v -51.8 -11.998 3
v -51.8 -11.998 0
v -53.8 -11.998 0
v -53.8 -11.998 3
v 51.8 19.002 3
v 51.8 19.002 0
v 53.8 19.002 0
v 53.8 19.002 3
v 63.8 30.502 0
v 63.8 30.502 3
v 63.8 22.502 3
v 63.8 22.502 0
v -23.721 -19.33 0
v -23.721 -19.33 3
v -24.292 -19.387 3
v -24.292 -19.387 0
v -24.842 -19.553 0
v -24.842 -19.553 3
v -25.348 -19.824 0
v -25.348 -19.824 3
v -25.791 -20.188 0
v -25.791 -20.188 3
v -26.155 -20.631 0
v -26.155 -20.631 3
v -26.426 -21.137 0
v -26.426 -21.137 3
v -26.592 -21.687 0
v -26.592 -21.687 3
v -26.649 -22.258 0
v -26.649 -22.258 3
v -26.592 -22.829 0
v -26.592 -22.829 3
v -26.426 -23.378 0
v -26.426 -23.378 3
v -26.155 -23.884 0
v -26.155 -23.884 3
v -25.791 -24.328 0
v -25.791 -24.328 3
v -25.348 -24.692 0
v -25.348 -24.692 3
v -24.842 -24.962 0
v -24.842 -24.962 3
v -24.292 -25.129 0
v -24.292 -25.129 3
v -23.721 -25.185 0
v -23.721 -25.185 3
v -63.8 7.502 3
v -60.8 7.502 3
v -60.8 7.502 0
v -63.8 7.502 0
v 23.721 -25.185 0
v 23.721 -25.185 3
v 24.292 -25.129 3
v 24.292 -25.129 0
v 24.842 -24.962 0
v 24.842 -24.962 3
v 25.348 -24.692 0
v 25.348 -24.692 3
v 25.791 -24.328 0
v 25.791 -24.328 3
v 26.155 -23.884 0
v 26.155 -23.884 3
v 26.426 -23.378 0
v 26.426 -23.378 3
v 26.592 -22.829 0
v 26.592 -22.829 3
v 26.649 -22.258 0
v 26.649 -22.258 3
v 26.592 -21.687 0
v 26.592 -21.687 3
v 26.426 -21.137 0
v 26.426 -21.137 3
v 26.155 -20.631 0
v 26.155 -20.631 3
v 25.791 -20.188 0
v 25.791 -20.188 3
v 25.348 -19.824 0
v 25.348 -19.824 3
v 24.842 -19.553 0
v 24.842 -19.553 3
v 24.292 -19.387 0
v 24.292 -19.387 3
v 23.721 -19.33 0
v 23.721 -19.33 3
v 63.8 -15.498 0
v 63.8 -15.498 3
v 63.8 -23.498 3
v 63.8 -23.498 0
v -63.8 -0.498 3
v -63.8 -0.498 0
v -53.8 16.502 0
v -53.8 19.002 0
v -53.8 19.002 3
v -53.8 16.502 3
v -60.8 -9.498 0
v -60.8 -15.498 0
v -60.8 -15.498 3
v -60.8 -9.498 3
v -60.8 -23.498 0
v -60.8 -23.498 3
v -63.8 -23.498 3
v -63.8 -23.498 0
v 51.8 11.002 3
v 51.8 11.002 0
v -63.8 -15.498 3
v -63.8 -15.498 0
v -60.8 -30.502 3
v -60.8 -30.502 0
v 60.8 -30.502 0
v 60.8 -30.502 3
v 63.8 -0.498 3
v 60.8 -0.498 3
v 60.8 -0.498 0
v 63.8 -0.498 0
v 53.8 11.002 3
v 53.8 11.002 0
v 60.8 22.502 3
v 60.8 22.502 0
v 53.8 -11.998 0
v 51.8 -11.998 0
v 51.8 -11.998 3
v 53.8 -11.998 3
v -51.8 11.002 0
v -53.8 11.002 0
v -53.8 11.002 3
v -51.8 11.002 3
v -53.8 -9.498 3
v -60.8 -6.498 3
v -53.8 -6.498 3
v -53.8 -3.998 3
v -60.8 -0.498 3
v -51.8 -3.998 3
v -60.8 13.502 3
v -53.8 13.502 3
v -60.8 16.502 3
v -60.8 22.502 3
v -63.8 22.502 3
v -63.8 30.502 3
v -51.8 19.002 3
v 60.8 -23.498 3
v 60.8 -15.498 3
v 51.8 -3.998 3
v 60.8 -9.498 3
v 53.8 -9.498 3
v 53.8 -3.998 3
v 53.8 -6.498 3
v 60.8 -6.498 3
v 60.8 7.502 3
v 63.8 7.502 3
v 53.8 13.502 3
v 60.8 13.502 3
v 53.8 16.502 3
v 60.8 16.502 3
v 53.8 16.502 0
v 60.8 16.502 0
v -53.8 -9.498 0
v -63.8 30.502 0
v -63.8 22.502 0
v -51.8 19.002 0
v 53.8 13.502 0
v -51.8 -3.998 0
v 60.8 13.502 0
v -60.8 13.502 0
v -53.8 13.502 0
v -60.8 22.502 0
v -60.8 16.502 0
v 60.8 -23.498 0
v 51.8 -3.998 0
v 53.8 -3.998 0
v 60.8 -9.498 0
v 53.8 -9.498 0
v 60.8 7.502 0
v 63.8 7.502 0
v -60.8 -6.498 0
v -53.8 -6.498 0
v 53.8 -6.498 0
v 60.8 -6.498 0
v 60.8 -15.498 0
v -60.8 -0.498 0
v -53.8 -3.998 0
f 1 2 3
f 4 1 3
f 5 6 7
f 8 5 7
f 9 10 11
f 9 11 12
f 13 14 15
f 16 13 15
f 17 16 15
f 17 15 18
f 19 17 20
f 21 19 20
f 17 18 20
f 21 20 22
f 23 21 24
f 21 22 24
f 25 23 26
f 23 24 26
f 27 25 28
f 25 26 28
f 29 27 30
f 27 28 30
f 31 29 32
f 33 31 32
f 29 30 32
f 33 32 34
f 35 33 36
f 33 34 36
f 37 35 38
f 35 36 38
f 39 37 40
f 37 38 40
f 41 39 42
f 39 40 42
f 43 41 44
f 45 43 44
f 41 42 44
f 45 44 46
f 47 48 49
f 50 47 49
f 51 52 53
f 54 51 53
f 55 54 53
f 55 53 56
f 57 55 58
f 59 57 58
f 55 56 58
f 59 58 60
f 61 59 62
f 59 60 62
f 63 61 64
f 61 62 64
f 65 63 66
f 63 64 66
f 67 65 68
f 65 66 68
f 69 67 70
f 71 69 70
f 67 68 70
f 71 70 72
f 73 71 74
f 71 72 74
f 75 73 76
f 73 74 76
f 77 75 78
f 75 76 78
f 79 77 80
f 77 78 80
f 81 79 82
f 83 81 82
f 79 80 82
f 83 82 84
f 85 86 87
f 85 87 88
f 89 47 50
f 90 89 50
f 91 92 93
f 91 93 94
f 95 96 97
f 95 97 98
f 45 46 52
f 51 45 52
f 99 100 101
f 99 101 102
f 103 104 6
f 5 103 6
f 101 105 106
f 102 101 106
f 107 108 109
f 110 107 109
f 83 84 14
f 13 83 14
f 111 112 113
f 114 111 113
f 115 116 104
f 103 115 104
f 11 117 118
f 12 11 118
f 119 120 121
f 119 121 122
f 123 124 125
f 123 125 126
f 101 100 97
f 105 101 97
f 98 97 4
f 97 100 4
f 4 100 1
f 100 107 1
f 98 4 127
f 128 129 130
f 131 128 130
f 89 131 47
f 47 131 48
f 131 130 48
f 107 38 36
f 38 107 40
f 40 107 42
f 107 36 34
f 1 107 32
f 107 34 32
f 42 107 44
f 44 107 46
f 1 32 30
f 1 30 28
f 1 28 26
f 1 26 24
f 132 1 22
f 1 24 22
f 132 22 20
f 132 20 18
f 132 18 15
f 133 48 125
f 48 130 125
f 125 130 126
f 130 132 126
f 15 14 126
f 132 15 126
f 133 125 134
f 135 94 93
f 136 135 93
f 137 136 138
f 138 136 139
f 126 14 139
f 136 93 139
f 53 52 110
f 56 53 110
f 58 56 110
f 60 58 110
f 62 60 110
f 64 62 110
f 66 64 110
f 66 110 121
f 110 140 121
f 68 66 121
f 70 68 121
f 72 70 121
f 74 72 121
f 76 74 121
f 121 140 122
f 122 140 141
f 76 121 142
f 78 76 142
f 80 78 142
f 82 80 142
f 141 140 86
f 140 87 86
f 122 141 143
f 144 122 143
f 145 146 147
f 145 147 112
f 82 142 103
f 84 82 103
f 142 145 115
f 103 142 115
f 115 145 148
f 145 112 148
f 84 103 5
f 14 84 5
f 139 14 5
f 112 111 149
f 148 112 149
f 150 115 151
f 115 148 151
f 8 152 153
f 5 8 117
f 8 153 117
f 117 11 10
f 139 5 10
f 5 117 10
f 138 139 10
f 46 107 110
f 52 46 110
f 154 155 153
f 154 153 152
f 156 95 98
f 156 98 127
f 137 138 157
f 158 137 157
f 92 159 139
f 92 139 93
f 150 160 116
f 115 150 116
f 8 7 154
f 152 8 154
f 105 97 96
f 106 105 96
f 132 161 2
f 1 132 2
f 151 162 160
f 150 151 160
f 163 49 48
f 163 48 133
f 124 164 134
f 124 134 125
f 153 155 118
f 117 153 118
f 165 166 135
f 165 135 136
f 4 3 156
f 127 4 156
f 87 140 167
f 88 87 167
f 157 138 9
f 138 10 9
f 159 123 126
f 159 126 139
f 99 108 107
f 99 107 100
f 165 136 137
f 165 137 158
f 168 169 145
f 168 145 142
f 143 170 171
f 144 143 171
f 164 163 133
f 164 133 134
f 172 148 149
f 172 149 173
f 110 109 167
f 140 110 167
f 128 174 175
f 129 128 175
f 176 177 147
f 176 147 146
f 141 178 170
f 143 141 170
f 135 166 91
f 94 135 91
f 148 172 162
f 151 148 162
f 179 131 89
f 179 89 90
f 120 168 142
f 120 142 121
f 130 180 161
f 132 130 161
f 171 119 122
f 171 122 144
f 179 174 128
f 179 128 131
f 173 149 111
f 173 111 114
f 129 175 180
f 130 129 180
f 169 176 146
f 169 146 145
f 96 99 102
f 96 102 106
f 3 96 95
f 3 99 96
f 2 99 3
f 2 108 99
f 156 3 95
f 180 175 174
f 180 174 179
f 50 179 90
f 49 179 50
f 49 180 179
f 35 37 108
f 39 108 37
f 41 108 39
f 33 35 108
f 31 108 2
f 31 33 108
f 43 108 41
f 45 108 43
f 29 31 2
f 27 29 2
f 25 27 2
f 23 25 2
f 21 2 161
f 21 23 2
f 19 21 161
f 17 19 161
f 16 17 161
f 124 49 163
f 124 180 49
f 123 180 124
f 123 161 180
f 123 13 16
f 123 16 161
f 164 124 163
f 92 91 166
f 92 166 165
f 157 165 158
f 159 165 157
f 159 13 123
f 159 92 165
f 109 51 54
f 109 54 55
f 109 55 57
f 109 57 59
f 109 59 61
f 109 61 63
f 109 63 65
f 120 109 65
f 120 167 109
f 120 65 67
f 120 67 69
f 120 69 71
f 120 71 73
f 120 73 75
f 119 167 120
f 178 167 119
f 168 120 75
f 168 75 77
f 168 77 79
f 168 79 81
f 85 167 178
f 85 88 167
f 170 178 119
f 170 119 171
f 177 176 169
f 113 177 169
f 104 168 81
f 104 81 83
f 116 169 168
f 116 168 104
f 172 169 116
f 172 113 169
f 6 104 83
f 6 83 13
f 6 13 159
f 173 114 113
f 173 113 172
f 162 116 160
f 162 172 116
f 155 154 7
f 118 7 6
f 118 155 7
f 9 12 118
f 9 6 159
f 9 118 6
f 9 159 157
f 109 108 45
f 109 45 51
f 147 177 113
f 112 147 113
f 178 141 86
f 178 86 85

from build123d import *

# Parameters (mm, degrees)
SKETCH1_W               = 121.6
SKETCH1_H               = 61.004801574
BOSS_EXTRUDE1_DEPTH     = 3
SKETCH3_W               = 3
SKETCH3_H               = 8
BOSS_EXTRUDE2_DEPTH     = 3
SKETCH5_W               = 7
SKETCH5_H               = 3
CUT_EXTRUDE1_DEPTH      = 71.780198176
MIRROR3_COPY_1_SKETCH_W = 7
MIRROR3_COPY_1_SKETCH_H = 3
MIRROR3_COPY_1_DEPTH    = 71.780198176
VELCROHOLE_DEPTH        = 71.780198176
VELCROHOLE_DEPTH_BACK   = 71.780198176


with BuildPart() as part:
    # Sketch1 → Boss-Extrude1 (new body)
    with BuildSketch(Plane.XY):
        Rectangle(SKETCH1_W, SKETCH1_H)
    extrude(amount=BOSS_EXTRUDE1_DEPTH)

    # Sketch3 → Boss-Extrude2 (add)
    with BuildSketch(Plane(origin=(60.8, 0, 0), x_dir=(0, 0, -1), z_dir=(1, 0, 0))):
        with Locations((-1.5, 26.502400787)):
            Rectangle(SKETCH3_W, SKETCH3_H)
        with Locations((-1.5, 3.502400787)):
            Rectangle(SKETCH3_W, SKETCH3_H)
        with Locations((-1.5, -19.497599213)):
            Rectangle(SKETCH3_W, SKETCH3_H)
    boss_extrude2 = extrude(amount=BOSS_EXTRUDE2_DEPTH)

    # Mirror1: Boss-Extrude2 across plane
    add(boss_extrude2.mirror(Plane(origin=(0, 0, 0), x_dir=(0, 0, 1), z_dir=(1, 0, 0))))

    # Sketch5 → Cut-Extrude1 (cut, through all)
    with BuildSketch(Plane(origin=(0, 0, 0), x_dir=(-1, 0, 0), z_dir=(0, 0, -1))):
        with Locations((-57.3, 15.002400787)):
            Rectangle(SKETCH5_W, SKETCH5_H)
        Polygon((-53.8, 19.002400787), (-53.8, 16.502400787), (-53.8, 13.502400787), (-53.8, 11.002400787), (-51.8, 11.002400787), (-51.8, 19.002400787), align=None)
    cut_extrude1 = extrude(amount=-CUT_EXTRUDE1_DEPTH, mode=Mode.SUBTRACT)

    # Mirror2: Cut-Extrude1 across plane
    add(cut_extrude1.mirror(Plane(origin=(0, 0, 0), x_dir=(0, 0, 1), z_dir=(1, 0, 0))), mode=Mode.SUBTRACT)

    # Mirror3: Cut-Extrude1 across plane
    add(cut_extrude1.mirror(Plane(origin=(0, 3.502400787, 0), x_dir=(0, 0, 1), z_dir=(0, -1, 0))), mode=Mode.SUBTRACT)

    # Mirror3 copy 1 sketch → Mirror3 copy 1 (cut, through all)
    with BuildSketch(Plane(origin=(0, 7.004801574, 0), x_dir=(1, 0, 0), z_dir=(0, 0, -1))):
        with Locations((-57.3, 15.002400787)):
            Rectangle(MIRROR3_COPY_1_SKETCH_W, MIRROR3_COPY_1_SKETCH_H)
        Polygon((-53.8, 19.002400787), (-53.8, 16.502400787), (-53.8, 13.502400787), (-53.8, 11.002400787), (-51.8, 11.002400787), (-51.8, 19.002400787), align=None)
    extrude(amount=-MIRROR3_COPY_1_DEPTH, mode=Mode.SUBTRACT)

    # Sketch6 → VelcroHole (cut, two sides: drawn at the far end of the back side and taken through both)
    with BuildSketch(Plane(origin=(0, 0, 0), x_dir=(-1, 0, 0), z_dir=(0, 0, -1)).offset(-VELCROHOLE_DEPTH_BACK)):
        with BuildLine():
            Line((-23.721301338, -19.330337048), (23.721301338, -19.330337048))
            ThreePointArc((23.721301338, -19.330337048), (26.648610865, -22.257646575), (23.721301338, -25.184956102))
            Line((23.721301338, -25.184956102), (-23.721301338, -25.184956102))
            ThreePointArc((-23.721301338, -25.184956102), (-26.648610865, -22.257646575), (-23.721301338, -19.330337048))
        make_face()
    extrude(amount=VELCROHOLE_DEPTH + VELCROHOLE_DEPTH_BACK, mode=Mode.SUBTRACT)


solid = part.part
